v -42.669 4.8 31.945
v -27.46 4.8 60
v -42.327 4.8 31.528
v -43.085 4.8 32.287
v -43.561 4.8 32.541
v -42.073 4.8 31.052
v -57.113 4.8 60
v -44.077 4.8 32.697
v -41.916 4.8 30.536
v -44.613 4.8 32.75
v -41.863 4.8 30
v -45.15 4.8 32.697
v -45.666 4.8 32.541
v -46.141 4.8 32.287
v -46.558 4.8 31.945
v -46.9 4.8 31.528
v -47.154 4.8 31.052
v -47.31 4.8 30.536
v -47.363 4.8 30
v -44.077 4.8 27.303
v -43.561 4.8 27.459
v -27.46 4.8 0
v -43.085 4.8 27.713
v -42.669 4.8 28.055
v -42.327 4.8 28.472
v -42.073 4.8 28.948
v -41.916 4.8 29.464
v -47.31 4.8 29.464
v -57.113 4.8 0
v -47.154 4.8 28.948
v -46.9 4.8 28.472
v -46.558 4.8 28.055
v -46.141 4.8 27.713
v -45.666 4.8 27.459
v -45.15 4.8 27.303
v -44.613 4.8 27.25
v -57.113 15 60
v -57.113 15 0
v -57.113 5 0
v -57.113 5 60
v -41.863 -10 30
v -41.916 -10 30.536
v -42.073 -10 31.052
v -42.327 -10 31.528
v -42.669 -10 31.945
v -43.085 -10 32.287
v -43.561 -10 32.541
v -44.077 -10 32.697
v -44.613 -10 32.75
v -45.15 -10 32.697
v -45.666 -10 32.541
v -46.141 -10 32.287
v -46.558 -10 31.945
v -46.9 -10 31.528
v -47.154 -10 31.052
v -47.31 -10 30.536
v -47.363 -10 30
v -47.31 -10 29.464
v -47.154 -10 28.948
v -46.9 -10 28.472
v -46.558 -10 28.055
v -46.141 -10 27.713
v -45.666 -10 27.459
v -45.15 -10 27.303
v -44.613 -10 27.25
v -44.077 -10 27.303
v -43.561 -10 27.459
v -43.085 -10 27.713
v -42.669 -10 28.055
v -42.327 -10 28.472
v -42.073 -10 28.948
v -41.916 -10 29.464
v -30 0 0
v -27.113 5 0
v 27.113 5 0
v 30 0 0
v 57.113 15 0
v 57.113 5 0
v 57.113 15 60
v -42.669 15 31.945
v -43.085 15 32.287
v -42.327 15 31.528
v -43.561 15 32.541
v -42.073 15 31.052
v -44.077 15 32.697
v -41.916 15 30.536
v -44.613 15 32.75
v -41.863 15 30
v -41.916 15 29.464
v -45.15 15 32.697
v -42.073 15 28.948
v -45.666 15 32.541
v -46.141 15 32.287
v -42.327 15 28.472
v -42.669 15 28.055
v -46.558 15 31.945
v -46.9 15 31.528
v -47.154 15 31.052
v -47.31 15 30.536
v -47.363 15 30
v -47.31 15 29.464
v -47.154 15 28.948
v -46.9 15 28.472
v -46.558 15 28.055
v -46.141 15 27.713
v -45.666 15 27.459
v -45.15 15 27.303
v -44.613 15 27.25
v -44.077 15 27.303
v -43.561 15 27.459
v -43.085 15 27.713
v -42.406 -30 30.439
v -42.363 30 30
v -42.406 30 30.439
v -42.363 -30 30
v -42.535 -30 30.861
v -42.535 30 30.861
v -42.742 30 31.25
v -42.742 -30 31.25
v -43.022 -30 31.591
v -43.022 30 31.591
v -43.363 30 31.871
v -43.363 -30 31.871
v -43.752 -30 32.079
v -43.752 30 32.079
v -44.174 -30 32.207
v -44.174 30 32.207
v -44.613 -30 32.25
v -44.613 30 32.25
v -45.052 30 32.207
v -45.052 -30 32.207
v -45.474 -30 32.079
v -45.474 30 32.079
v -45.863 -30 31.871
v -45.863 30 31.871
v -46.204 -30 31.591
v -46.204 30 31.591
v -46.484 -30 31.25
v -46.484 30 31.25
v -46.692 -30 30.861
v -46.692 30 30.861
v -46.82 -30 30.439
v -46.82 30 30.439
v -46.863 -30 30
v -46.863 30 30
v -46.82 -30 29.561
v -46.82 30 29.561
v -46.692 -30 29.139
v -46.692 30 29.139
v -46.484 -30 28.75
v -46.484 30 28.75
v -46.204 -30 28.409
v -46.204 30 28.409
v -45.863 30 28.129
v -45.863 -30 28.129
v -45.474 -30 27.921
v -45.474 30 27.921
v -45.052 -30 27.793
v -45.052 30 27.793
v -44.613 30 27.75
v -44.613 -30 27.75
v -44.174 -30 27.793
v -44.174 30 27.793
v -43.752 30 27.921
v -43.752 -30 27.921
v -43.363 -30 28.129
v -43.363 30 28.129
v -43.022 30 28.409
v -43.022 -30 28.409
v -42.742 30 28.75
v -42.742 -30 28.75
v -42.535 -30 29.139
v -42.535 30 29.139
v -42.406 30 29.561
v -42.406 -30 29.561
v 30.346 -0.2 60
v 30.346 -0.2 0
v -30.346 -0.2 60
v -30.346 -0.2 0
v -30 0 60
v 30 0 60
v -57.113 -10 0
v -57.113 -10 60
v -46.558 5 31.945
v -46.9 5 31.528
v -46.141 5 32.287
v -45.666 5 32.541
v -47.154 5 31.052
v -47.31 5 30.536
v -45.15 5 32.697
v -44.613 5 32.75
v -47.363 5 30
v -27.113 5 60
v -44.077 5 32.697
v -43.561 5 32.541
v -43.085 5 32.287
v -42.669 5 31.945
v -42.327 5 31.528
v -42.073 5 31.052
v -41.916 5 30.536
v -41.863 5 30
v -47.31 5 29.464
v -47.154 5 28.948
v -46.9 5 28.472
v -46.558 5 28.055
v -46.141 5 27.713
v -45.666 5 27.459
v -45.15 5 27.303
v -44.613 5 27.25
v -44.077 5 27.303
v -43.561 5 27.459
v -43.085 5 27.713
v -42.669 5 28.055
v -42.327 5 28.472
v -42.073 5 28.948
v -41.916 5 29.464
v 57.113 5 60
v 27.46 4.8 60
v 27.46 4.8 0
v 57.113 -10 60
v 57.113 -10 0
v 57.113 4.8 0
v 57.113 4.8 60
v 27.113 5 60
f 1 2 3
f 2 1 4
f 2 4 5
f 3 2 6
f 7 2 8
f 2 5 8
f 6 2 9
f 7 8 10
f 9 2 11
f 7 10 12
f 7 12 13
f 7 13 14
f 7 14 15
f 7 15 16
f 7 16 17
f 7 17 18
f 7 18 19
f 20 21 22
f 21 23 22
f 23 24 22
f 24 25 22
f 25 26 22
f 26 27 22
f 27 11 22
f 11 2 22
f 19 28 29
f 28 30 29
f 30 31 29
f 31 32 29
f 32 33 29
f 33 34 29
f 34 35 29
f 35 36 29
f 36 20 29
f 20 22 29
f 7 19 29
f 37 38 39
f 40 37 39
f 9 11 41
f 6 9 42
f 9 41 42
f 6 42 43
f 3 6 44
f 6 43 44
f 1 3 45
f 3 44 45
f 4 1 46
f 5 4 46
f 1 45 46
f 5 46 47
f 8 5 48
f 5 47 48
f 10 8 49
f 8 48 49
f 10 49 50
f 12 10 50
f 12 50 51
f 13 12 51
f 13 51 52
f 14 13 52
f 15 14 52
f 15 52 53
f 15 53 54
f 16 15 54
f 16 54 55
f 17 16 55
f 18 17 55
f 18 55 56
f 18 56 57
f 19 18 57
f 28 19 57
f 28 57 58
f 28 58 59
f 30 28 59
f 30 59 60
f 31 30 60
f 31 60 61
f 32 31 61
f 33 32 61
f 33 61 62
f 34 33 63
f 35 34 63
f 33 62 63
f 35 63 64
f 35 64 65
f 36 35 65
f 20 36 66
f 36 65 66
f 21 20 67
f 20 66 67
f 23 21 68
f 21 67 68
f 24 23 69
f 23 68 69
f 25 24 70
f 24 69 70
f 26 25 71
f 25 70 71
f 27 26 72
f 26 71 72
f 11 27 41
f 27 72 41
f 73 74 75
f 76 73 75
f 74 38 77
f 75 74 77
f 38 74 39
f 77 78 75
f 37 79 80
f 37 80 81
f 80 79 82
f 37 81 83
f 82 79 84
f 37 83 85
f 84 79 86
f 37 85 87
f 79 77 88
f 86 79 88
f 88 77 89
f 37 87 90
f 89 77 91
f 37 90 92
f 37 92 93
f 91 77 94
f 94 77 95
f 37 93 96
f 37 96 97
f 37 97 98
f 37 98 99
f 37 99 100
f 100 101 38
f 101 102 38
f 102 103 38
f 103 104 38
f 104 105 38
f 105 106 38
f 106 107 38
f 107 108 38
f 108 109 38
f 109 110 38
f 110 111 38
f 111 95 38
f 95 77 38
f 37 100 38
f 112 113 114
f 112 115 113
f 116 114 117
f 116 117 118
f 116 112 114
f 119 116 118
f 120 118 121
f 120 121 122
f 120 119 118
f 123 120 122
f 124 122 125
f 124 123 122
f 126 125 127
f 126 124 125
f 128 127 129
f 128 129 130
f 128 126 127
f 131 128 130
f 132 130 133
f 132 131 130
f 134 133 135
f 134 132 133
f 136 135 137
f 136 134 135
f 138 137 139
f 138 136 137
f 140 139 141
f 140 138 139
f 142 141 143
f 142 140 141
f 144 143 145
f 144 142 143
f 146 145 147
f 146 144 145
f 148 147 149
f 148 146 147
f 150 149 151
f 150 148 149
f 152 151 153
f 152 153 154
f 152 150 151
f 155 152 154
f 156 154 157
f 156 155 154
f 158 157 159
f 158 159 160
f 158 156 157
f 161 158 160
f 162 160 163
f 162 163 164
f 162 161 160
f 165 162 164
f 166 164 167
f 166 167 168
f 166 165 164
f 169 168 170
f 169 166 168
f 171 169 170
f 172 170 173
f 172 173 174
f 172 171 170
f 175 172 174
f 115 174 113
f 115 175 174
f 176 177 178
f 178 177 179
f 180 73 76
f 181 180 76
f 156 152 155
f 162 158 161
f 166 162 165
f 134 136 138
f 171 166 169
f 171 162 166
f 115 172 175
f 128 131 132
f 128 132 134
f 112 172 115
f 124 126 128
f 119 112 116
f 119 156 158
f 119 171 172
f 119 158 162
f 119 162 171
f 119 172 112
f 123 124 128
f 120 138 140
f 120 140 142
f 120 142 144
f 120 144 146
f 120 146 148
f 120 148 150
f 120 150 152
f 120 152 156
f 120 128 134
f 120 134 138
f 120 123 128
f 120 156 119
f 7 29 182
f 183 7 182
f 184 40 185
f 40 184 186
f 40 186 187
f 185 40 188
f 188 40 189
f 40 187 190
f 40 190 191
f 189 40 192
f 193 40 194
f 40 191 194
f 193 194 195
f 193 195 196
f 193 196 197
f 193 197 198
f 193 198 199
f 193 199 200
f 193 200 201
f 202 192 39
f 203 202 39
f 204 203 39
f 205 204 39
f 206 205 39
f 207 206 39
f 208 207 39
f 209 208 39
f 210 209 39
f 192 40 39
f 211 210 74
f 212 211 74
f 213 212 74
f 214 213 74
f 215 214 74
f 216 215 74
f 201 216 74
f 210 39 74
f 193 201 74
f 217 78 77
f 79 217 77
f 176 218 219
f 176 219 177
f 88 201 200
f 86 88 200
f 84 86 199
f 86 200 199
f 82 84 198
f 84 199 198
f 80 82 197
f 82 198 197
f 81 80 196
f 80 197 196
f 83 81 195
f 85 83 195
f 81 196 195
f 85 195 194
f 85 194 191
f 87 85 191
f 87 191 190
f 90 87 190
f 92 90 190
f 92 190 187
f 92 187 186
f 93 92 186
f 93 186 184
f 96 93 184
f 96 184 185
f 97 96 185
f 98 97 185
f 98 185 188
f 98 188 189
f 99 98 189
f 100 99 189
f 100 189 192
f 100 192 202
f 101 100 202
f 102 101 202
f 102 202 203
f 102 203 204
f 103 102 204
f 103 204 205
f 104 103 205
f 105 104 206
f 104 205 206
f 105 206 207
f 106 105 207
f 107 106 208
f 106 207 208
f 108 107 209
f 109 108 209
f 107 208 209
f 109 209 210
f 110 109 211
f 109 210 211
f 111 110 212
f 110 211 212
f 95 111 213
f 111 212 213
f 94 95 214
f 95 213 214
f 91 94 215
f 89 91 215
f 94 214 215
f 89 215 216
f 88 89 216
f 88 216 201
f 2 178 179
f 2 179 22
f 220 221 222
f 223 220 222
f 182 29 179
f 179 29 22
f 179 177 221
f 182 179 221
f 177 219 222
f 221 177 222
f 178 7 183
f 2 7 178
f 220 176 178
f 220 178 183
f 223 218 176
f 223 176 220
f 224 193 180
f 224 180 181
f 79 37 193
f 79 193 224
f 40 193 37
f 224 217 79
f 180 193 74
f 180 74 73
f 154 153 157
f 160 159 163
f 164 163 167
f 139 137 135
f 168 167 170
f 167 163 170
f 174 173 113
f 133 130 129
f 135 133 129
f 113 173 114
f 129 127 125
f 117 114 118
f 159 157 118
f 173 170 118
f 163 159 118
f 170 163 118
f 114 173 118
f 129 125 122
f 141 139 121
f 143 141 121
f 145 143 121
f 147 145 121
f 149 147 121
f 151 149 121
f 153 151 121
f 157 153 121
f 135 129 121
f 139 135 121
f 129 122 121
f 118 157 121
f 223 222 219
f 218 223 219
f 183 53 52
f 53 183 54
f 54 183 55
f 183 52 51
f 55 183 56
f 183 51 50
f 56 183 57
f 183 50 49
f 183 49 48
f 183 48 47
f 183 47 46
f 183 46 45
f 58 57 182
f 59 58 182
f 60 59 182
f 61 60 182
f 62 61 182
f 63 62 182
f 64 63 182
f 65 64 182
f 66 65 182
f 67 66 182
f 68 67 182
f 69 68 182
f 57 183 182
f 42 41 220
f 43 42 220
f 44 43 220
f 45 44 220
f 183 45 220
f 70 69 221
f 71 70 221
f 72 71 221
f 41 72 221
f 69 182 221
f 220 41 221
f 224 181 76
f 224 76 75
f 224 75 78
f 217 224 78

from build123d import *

# Parameters (mm, degrees)
F1_DEPTH = 60
F3_D     = 5.5
F3_2_D   = 5.5
F4_R     = 2.25
F5_DEPTH = 30


with BuildPart() as f1:
    # F0 (on Top) → F1 (new body)
    with BuildSketch(Plane.XY):
        Polygon((57.1132486541, 15), (-57.1132486541, 15), (-57.1132486541, 5), (-27.1132486541, 5), (-30, 0), (0, 0), (30, 0), (27.1132486541, 5), (57.1132486541, 5), align=None)
    extrude(amount=F1_DEPTH)

    # F3 (through all)
    with Locations(Plane(origin=(0, 15, 0), x_dir=(-1, 0, 0), z_dir=(0, 1, 0))):
        with Locations((44.6132486541, 30)):
            Hole(F3_D / 2)


with BuildPart() as f1b:
    # F0 (on Top) → F1, piece 2 (new body)
    with BuildSketch(Plane.XY):
        Polygon((-27.4596588156, 4.8), (-57.1132486541, 4.8), (-57.1132486541, -10), (57.1132486541, -10), (57.1132486541, 4.8), (27.4596588156, 4.8), (30.3464101615, -0.2), (0, -0.2), (-30.3464101615, -0.2), align=None)
    extrude(amount=F1_DEPTH)

    # F3#2 (through all)
    with Locations(Plane(origin=(0, 15, 0), x_dir=(-1, 0, 0), z_dir=(0, 1, 0))):
        with Locations((44.6132486541, 30)):
            Hole(F3_2_D / 2)


with BuildPart() as f5:
    # F4 (on Front) → F5 (new body, symmetric)
    with BuildSketch(Plane.XZ):
        with Locations((-44.6132486541, 30)):
            Circle(F4_R)
    extrude(amount=F5_DEPTH, both=True)


solid = Compound([f1.part, f1b.part, f5.part])
